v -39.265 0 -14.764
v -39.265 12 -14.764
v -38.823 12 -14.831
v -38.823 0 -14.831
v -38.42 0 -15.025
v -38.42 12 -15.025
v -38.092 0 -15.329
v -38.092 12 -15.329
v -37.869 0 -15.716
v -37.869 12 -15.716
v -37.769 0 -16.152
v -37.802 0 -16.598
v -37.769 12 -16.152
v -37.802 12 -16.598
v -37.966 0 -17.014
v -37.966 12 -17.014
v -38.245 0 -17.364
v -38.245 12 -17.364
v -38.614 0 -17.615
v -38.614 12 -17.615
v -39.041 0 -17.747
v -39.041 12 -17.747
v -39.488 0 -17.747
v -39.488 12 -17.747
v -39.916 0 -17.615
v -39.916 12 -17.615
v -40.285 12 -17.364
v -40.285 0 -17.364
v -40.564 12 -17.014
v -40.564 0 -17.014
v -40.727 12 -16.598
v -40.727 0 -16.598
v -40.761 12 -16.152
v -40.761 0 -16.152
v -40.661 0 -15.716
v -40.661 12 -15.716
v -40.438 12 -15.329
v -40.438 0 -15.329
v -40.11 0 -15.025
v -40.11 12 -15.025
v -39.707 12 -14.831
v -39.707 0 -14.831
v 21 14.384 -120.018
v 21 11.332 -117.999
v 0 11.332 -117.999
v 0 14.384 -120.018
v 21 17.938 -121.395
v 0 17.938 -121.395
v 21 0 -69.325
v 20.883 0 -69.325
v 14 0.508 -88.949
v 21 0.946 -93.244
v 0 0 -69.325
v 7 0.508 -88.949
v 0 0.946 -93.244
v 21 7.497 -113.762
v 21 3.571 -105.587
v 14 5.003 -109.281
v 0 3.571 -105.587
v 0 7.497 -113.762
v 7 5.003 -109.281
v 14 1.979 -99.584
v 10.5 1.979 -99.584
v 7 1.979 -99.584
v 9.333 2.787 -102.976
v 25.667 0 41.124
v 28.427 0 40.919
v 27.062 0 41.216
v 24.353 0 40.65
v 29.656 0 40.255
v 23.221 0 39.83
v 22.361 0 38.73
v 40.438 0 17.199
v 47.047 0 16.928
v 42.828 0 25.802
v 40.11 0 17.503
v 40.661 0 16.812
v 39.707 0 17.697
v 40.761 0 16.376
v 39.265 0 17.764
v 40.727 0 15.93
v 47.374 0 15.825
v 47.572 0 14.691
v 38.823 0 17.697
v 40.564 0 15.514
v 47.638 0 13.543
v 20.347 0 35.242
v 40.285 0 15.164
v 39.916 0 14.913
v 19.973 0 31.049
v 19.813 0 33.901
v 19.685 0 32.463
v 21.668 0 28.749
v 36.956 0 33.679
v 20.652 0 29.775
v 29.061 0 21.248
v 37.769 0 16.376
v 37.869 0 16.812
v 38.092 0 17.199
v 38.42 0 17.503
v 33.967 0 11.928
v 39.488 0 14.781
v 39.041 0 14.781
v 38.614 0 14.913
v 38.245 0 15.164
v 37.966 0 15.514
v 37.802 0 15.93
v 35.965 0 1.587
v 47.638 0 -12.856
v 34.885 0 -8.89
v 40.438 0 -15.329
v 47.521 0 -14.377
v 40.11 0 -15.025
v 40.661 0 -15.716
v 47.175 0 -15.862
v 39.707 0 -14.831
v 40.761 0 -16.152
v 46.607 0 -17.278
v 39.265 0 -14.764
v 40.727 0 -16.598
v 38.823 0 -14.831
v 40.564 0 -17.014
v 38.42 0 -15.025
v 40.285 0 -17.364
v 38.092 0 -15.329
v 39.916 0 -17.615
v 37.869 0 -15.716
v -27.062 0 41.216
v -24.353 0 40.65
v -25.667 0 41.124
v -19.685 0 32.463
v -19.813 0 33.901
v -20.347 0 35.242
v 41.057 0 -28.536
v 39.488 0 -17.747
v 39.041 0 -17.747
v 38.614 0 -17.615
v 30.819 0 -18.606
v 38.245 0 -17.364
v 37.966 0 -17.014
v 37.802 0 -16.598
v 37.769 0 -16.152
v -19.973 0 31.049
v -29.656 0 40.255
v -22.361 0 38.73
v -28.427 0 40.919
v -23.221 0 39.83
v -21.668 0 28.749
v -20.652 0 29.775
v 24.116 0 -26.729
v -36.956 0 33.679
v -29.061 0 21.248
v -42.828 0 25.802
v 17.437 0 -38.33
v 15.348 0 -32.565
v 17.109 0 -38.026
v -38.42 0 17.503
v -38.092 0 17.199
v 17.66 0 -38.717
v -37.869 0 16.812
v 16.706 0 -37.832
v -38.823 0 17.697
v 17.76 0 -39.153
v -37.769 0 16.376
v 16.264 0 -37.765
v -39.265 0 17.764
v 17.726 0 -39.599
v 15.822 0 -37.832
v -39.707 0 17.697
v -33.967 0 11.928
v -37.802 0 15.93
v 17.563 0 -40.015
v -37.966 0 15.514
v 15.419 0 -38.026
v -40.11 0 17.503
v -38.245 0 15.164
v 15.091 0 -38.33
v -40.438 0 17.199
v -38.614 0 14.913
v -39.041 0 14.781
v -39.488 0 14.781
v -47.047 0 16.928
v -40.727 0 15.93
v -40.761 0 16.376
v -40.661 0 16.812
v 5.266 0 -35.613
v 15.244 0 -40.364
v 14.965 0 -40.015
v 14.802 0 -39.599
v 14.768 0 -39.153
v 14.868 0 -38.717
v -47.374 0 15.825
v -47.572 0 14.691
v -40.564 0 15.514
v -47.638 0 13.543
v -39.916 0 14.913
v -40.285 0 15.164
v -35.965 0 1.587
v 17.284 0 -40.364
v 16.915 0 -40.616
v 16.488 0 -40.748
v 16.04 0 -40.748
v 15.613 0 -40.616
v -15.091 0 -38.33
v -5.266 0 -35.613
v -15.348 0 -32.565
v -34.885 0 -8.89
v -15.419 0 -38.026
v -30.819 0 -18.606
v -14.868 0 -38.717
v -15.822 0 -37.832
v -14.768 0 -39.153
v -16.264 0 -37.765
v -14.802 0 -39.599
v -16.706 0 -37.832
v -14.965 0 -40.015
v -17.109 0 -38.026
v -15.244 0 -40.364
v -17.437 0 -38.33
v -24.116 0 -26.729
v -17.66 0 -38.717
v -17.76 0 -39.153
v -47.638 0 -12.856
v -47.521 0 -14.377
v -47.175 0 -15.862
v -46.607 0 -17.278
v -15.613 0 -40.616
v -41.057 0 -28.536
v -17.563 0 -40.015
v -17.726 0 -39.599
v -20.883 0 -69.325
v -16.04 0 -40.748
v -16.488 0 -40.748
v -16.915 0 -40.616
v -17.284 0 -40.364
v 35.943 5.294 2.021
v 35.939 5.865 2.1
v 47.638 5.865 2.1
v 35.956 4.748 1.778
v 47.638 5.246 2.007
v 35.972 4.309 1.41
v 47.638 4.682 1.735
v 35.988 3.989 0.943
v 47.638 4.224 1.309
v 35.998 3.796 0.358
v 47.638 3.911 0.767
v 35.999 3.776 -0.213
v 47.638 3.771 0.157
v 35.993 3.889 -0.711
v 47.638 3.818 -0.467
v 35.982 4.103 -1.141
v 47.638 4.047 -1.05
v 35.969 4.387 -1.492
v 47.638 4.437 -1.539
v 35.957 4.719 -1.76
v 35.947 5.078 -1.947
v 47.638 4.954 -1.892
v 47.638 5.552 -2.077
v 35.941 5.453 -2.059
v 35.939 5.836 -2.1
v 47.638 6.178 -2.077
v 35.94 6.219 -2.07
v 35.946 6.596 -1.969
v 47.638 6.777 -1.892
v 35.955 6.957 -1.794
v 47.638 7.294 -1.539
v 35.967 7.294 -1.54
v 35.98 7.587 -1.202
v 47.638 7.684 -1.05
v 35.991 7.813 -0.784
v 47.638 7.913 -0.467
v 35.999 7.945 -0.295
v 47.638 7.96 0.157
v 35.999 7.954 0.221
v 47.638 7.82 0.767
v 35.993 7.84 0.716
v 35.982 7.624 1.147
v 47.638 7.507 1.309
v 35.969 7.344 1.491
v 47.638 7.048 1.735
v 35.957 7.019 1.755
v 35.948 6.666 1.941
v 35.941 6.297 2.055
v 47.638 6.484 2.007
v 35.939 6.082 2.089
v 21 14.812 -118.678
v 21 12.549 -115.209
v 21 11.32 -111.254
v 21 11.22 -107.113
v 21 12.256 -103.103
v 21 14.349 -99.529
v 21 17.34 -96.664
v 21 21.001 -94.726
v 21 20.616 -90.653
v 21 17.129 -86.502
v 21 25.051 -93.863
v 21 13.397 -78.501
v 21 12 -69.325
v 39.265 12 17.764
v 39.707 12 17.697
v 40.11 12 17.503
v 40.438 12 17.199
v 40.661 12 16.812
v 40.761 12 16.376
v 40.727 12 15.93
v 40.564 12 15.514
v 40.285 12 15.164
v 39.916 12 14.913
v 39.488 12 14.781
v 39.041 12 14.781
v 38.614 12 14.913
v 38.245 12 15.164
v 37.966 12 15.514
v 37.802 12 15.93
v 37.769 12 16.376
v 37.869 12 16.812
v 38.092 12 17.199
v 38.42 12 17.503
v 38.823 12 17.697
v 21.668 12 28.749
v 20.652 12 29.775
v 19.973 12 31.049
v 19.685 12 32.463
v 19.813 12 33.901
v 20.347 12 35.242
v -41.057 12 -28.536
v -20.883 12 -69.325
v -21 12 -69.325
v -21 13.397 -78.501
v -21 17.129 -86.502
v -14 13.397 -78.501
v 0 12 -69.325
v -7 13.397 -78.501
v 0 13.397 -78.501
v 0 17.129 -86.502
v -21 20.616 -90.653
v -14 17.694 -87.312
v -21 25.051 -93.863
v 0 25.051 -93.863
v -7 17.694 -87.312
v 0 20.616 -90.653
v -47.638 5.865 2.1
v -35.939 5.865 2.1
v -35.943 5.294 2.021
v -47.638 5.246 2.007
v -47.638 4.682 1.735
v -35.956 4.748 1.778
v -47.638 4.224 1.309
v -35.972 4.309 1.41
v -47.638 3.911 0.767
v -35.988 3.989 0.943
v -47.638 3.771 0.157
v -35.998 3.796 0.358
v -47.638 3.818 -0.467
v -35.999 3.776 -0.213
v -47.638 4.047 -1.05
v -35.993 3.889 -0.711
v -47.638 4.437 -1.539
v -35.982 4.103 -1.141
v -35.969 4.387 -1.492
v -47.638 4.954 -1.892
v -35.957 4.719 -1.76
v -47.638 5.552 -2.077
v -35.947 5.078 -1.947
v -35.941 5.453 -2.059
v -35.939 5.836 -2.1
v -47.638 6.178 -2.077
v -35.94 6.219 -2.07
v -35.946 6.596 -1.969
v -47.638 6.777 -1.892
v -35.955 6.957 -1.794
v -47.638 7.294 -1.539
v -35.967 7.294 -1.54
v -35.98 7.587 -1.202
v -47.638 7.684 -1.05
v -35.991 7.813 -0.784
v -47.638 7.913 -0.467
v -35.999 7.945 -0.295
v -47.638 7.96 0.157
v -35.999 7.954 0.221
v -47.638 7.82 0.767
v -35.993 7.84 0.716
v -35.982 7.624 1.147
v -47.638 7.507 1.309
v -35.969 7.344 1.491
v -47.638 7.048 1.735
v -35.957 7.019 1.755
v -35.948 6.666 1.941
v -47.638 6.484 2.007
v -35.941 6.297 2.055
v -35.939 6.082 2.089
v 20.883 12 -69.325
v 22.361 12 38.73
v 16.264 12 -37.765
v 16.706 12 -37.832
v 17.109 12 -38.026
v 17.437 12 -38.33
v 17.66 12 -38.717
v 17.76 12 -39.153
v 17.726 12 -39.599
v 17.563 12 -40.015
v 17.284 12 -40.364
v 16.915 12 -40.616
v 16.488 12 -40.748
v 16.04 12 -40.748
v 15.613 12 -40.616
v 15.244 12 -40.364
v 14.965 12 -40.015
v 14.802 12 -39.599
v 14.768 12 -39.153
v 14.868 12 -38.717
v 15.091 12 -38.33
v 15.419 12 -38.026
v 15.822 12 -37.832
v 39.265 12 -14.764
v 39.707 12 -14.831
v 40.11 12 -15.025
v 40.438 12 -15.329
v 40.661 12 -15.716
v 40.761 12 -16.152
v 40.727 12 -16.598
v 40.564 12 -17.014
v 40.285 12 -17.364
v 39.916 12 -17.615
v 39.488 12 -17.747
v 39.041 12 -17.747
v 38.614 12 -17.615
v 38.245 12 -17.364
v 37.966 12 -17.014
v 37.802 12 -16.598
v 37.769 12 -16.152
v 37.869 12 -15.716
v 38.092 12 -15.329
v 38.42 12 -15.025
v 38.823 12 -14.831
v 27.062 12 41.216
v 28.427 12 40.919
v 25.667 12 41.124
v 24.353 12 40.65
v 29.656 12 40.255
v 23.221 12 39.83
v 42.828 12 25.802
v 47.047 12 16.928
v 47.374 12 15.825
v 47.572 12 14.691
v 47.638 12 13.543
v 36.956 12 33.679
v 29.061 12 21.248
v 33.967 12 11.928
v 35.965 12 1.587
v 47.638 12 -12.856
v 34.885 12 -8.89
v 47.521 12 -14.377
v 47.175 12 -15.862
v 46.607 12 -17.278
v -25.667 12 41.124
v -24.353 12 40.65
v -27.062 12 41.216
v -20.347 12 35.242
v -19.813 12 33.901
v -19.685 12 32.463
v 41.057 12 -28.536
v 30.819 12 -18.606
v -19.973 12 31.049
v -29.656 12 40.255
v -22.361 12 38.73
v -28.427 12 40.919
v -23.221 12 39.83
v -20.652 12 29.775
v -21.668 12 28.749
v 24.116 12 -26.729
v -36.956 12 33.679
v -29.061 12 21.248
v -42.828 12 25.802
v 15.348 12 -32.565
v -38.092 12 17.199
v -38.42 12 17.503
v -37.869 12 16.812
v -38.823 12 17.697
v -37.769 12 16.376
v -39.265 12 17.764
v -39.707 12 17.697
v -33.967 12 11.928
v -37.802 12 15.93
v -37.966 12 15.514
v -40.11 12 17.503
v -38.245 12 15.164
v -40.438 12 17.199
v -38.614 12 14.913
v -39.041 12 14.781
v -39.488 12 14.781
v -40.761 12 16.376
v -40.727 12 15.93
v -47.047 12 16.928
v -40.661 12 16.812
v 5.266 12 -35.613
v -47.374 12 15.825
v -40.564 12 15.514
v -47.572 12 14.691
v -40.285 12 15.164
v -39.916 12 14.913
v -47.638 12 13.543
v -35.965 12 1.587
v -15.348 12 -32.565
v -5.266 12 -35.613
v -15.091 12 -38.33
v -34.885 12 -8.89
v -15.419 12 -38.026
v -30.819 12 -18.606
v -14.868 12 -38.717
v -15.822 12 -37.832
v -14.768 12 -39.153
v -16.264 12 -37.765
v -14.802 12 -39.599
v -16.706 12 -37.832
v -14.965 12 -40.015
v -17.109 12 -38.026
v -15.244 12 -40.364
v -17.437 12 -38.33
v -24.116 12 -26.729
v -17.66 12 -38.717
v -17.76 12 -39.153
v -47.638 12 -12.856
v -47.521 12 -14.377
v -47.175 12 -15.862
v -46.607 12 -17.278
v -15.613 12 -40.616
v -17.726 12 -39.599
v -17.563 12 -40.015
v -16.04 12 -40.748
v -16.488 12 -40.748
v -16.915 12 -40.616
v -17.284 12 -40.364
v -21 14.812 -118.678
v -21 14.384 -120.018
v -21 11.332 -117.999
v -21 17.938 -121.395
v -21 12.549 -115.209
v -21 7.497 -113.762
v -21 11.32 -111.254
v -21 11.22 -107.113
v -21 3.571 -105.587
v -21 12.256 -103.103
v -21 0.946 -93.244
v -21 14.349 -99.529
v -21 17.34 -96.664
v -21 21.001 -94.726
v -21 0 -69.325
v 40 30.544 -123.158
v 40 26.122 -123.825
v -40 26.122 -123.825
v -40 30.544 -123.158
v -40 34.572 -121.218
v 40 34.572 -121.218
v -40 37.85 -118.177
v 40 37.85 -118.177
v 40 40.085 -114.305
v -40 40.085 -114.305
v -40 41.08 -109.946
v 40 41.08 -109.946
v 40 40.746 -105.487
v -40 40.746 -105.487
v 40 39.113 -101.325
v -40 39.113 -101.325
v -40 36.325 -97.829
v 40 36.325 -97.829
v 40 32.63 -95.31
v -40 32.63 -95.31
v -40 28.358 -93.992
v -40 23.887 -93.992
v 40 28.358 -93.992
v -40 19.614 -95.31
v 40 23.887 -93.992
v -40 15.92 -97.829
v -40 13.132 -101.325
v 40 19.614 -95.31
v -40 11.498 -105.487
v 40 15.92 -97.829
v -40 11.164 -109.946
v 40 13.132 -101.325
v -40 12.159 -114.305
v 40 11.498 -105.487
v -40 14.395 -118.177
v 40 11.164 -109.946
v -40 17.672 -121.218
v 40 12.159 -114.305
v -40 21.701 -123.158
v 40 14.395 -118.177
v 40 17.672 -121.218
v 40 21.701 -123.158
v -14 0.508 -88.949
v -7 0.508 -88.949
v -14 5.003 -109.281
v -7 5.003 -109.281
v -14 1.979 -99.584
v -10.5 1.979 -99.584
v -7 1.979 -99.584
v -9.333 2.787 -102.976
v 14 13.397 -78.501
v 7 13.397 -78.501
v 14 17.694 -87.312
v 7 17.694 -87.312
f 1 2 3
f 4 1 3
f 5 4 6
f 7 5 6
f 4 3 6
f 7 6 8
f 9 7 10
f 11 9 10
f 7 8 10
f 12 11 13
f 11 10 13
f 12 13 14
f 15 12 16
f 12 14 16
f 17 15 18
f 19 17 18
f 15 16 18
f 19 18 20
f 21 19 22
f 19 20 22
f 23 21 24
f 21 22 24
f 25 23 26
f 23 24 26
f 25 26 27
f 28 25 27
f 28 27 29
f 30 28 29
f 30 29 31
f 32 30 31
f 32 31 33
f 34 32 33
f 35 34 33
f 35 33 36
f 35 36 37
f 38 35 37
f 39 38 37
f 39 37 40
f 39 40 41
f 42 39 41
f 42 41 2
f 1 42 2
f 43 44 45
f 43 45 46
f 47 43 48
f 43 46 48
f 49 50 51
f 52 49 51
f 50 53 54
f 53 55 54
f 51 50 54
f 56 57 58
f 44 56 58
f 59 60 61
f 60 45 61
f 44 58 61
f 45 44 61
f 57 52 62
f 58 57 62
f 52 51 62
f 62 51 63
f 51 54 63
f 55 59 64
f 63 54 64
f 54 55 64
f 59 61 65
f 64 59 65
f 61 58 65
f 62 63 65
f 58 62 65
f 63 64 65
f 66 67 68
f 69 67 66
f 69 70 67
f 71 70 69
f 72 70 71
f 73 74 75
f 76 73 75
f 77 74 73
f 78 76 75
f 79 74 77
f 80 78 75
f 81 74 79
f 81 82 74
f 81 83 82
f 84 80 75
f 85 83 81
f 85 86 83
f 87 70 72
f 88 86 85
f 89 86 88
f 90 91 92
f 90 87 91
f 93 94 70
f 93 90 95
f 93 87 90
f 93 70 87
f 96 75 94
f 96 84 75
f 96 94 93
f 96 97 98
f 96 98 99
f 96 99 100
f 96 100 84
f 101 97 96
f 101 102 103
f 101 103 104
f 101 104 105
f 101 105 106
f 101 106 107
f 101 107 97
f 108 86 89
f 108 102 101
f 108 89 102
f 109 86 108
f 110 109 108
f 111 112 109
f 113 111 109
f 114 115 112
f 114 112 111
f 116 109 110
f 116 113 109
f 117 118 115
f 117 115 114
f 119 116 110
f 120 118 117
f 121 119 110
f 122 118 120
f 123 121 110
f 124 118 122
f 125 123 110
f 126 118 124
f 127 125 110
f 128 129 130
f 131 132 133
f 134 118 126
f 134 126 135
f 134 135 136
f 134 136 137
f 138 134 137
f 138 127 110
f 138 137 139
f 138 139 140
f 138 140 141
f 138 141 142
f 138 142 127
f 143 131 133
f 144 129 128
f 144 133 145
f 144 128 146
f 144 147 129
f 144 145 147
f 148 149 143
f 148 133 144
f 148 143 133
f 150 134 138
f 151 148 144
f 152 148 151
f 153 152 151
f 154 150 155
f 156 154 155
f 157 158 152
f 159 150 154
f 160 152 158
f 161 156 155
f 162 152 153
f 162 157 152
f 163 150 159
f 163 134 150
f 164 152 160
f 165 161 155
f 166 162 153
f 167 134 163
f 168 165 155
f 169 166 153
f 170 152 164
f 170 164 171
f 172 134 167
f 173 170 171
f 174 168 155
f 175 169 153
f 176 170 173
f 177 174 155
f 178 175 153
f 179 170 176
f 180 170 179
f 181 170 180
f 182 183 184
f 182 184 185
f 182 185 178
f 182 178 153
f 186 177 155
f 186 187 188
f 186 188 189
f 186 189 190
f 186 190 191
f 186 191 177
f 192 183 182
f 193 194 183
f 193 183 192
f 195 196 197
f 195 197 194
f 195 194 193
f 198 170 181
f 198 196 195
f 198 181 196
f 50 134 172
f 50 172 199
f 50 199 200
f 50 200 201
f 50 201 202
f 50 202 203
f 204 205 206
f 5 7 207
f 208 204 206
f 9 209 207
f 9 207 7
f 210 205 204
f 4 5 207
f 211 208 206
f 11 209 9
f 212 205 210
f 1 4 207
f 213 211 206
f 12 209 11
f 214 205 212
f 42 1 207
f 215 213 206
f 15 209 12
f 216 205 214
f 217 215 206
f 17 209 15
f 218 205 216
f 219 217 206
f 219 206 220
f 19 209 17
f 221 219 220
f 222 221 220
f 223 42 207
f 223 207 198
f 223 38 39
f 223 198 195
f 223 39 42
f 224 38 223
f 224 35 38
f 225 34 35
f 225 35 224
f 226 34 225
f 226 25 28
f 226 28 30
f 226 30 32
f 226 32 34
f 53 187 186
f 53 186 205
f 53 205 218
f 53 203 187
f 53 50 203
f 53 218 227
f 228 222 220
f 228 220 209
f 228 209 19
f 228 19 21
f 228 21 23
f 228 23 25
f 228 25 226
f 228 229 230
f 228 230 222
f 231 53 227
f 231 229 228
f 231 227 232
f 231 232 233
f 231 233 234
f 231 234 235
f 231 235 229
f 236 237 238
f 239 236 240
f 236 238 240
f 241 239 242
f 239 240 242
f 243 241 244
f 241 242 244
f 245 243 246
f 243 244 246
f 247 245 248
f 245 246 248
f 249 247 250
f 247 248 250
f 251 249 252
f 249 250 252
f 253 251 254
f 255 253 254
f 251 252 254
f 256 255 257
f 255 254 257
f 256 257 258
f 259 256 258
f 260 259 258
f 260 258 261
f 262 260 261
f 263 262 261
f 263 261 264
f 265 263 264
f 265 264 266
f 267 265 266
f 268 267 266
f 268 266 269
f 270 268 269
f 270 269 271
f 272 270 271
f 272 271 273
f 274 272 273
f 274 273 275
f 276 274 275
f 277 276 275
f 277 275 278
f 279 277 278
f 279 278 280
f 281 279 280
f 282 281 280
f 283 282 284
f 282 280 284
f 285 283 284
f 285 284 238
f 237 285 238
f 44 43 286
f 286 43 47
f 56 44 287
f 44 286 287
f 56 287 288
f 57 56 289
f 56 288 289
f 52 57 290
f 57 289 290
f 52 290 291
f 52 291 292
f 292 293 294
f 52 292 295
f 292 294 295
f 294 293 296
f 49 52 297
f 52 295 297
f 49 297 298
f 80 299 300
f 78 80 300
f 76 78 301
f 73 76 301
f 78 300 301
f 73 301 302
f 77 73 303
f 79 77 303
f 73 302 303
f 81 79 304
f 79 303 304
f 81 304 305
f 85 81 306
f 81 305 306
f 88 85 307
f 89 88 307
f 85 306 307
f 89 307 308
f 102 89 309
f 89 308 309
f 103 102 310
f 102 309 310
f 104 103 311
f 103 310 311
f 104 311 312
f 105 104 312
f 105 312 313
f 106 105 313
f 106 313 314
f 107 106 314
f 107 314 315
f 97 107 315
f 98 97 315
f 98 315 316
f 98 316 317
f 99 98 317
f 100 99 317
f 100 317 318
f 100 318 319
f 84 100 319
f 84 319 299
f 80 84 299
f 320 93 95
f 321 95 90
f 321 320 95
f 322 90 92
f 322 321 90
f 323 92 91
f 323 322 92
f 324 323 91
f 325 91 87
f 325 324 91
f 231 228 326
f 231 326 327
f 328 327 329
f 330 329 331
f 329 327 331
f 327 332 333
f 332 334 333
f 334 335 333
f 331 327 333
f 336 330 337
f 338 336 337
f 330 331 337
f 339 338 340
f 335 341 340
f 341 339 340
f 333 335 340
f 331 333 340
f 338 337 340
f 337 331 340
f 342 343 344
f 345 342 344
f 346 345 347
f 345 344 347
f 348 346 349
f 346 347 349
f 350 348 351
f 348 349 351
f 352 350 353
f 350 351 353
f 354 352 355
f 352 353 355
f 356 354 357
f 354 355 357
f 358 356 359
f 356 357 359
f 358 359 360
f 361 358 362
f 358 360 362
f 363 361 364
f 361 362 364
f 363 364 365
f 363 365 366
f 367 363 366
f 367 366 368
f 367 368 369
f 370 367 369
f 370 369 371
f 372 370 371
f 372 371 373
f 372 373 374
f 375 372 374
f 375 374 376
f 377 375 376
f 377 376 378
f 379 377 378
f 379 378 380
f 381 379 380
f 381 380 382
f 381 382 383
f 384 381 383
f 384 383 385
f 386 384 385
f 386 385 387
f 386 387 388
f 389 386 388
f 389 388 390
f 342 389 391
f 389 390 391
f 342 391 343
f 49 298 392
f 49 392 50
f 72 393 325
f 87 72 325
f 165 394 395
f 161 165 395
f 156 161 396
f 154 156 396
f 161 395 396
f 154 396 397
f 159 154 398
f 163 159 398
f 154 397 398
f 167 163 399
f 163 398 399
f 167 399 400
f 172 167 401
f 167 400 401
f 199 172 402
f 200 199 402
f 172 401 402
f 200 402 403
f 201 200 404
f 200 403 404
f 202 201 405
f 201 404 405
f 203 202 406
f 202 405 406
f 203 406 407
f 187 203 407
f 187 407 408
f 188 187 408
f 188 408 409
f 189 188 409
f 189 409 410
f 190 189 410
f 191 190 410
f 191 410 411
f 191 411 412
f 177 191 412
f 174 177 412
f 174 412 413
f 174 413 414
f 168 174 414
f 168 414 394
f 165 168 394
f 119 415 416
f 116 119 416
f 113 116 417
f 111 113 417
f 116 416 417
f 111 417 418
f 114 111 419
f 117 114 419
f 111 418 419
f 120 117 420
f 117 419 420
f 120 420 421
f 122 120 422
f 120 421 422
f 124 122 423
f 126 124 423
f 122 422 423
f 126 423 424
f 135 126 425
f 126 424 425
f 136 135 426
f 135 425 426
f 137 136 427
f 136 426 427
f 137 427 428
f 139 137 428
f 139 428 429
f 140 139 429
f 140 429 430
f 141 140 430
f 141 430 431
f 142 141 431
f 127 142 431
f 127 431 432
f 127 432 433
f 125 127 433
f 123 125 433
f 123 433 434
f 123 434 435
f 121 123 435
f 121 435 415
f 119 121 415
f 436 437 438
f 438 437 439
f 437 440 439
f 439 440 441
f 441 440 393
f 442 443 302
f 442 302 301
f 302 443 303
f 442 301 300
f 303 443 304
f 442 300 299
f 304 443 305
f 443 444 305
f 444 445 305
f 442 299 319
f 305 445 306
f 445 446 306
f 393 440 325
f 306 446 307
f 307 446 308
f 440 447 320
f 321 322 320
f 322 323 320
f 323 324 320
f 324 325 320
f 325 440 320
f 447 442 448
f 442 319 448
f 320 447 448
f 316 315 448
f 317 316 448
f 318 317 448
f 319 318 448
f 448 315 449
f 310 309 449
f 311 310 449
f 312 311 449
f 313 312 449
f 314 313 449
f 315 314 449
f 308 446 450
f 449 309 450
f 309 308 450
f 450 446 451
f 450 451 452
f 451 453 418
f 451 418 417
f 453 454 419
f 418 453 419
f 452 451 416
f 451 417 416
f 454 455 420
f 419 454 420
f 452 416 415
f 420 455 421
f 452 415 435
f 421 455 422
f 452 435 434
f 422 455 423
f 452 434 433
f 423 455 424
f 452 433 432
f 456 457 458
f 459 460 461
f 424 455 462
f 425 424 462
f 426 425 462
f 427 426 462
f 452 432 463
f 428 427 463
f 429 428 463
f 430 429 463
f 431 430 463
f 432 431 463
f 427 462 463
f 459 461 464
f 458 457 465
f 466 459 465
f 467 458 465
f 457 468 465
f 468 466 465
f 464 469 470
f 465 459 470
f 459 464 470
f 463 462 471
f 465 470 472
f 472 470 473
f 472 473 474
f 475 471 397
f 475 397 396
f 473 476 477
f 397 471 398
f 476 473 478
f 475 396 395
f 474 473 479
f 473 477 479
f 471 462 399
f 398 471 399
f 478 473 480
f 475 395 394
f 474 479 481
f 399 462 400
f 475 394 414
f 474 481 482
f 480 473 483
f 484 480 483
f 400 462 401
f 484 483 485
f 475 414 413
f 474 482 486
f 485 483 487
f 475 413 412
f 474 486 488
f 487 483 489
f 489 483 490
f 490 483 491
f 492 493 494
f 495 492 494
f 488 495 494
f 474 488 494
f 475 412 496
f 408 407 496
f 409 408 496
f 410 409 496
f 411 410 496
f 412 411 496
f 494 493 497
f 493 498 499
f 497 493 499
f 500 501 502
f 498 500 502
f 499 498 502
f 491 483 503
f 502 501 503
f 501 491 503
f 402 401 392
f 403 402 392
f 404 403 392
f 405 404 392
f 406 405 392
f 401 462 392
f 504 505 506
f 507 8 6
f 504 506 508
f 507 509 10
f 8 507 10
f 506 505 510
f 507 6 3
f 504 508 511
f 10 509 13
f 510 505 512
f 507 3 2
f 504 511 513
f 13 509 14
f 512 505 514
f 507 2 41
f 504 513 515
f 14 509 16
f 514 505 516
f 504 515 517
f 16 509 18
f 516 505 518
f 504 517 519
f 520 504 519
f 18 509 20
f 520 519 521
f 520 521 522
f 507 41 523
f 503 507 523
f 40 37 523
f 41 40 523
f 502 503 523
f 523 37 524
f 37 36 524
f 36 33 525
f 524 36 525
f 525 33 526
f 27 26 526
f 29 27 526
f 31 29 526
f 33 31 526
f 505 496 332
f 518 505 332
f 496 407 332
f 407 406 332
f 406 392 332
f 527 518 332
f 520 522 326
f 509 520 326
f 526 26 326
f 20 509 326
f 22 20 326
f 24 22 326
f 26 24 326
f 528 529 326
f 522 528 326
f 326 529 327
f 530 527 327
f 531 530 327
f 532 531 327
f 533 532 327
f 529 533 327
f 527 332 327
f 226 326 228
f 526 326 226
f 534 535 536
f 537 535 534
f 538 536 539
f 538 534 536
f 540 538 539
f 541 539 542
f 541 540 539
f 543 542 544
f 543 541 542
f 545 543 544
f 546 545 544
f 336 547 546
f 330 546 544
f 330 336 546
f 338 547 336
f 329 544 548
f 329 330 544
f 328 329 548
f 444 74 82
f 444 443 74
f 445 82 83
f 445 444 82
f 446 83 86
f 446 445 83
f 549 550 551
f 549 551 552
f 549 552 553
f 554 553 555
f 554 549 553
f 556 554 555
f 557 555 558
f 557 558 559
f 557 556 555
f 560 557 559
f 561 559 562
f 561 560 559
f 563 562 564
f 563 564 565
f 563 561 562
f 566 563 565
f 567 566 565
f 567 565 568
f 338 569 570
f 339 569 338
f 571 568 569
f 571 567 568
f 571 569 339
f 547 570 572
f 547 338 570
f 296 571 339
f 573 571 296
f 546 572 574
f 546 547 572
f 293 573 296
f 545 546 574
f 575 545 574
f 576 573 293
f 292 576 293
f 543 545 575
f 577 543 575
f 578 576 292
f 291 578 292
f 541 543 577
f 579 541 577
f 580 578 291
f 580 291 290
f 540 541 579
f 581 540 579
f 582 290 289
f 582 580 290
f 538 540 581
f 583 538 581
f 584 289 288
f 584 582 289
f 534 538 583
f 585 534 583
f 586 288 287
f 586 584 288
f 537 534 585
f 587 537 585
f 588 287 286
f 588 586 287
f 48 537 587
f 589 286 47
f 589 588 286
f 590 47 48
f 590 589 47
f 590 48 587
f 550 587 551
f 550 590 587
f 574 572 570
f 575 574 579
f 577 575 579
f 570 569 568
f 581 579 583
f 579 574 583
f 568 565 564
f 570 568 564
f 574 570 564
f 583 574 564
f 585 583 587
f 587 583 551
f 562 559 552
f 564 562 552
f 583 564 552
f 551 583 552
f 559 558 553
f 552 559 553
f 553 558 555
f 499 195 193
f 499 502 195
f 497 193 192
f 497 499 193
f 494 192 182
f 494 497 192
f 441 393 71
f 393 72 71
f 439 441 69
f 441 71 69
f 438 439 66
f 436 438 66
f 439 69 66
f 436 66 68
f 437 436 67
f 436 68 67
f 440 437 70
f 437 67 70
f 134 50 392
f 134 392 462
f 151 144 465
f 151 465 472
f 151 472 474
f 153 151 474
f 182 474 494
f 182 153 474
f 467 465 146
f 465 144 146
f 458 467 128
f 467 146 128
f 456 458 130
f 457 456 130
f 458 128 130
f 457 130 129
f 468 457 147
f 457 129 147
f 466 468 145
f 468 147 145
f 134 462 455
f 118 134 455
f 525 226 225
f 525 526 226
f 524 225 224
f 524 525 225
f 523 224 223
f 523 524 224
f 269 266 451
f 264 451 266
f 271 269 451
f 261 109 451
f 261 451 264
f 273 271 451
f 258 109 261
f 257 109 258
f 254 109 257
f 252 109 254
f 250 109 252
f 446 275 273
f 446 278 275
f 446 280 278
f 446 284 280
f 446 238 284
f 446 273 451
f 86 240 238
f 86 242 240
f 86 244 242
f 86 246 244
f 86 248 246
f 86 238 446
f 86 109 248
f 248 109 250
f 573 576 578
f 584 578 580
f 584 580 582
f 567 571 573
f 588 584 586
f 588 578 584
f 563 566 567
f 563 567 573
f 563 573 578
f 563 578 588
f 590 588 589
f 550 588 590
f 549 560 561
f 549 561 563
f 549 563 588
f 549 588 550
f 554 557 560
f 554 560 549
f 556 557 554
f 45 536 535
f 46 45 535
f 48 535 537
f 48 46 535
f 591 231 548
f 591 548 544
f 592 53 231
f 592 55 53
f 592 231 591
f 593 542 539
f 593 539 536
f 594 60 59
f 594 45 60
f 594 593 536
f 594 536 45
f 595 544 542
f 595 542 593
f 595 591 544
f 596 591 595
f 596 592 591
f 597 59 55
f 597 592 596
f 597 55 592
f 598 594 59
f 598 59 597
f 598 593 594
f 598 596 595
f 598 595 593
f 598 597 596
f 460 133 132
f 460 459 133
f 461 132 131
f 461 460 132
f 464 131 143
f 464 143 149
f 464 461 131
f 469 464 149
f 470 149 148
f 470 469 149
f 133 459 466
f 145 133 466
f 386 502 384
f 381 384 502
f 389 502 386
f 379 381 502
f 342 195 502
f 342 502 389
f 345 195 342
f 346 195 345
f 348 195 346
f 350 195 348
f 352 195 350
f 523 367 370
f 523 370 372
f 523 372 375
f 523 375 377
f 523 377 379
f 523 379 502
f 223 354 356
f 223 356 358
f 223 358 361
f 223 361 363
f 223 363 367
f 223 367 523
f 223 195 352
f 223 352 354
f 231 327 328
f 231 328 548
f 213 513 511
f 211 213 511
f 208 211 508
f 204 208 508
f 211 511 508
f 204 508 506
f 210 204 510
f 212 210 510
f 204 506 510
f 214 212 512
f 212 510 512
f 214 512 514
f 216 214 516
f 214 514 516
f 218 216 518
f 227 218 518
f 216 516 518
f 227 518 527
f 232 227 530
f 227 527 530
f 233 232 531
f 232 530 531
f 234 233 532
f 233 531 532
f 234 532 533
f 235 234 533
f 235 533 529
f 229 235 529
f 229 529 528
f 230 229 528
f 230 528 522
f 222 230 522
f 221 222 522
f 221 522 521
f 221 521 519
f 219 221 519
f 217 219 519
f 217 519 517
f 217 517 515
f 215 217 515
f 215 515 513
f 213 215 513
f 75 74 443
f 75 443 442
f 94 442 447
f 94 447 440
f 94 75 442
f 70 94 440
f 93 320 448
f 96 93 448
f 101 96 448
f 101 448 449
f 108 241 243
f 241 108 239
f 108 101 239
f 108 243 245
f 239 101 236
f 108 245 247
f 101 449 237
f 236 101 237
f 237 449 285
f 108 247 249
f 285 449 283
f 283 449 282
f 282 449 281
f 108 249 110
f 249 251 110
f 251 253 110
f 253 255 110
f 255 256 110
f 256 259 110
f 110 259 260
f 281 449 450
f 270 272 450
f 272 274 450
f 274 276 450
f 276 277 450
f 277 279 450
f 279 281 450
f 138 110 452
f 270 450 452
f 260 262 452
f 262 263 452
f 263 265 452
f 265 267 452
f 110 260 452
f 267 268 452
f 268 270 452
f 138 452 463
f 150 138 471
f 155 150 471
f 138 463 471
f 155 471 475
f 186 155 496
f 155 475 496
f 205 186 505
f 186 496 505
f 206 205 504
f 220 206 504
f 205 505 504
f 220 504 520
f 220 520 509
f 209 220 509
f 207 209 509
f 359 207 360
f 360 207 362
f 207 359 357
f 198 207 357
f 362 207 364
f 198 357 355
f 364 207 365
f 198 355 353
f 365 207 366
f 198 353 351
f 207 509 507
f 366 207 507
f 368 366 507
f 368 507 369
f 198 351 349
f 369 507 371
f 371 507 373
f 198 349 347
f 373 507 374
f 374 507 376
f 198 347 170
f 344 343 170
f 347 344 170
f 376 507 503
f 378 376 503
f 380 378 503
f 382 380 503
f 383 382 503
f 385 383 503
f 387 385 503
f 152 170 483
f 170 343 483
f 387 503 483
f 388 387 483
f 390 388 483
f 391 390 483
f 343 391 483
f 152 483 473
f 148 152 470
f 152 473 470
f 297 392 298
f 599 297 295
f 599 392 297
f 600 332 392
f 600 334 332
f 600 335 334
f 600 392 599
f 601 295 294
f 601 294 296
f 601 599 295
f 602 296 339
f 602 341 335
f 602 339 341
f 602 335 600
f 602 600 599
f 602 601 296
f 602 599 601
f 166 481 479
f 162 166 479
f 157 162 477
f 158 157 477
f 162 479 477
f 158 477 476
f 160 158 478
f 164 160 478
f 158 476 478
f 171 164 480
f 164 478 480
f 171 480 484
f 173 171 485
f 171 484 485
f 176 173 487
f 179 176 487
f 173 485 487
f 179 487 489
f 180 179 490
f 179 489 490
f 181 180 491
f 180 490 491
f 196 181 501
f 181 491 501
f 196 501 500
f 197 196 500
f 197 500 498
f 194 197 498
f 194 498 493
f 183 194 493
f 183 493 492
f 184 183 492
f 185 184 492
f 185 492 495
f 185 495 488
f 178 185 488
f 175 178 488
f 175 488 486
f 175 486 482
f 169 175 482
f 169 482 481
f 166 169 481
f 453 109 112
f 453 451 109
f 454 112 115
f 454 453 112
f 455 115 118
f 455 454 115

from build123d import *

# Parameters (mm, degrees)
BOSS_EXTRUDE1_DEPTH = 12
SKETCH2_R           = 18
CUT_EXTRUDE1_DEPTH  = 12
BOSS_EXTRUDE2_DEPTH = 21
SKETCH8_R           = 15
BOSS_EXTRUDE4_DEPTH = 40
SKETCH12_R          = 1.5
CUT_EXTRUDE3_DEPTH  = 136.830697271
SKETCH13_R          = 36
CUT_EXTRUDE4_DEPTH  = 136.830697271
CUT_EXTRUDE5_DEPTH  = 136.830697271
FILLET1_R           = 5
M5_TAPPED_HOLE1_D   = 4.2
CUT_EXTRUDE6_DEPTH  = 136.830697306
FILLET2_R           = 10


with BuildPart() as part:
    # Sketch1 → Boss-Extrude1 (new body)
    with BuildSketch(Plane(origin=(0, 0, 0), x_dir=(1, 0, 0), z_dir=(0, 1, 0))):
        with BuildLine():
            Line((-20.882573235, 69.325415808), (20.882573235, 69.325415808))
            Line((20.882573235, 69.325415808), (41.057018878, 28.536313722))
            ThreePointArc((41.057018878, 28.536313722), (44.846867978, 22.107881683), (47.637749602, 15.186994859))
            Line((47.637749602, 15.186994859), (47.637749602, -15.186994859))
            ThreePointArc((47.637749602, -15.186994859), (0, -50), (-47.637749602, -15.186994859))
            Line((-47.637749602, -15.186994859), (-47.637749602, 15.186994859))
            ThreePointArc((-47.637749602, 15.186994859), (-44.846867978, 22.107881683), (-41.057018878, 28.536313722))
            Line((-41.057018878, 28.536313722), (-20.882573235, 69.325415808))
        make_face()
    extrude(amount=BOSS_EXTRUDE1_DEPTH)

    # Sketch2 → Cut-Extrude1 (cut)
    with BuildSketch(Plane.XZ):
        with Locations(Location((0, 0, 0), (0, 0, 270))):
            Circle(SKETCH2_R)
    extrude(amount=-CUT_EXTRUDE1_DEPTH, mode=Mode.SUBTRACT)

    # Sketch4 → Boss-Extrude2 (add, symmetric)
    with BuildSketch(Plane(origin=(0, 0, 0), x_dir=(0, 0, -1), z_dir=(1, 0, 0))):
        with BuildLine():
            add(Edge.make_bspline(
                [(69.325415808, 12), (78.050182199, 12), (89.075370915, 16.109716253), (93.862821874, 25.051459816)],
                knots=[0, 0, 0, 0, 0.77117819, 0.77117819, 0.77117819, 0.77117819], degree=3))
            Line((69.325415808, 12), (69.325415808, 0))
            add(Edge.make_bspline(
                [(69.325415808, 0), (85.617905629, 0), (116.367065239, -0.702532384), (121.3953127, 17.938299278)],
                knots=[0, 0, 0, 0, 1, 1, 1, 1], degree=3))
            ThreePointArc((121.3953127, 17.938299278), (105.072430052, 11.59905464), (93.862821874, 25.051459816))
        make_face()
    extrude(amount=BOSS_EXTRUDE2_DEPTH, both=True)

    # Sketch8 → Boss-Extrude4 (add, symmetric)
    with BuildSketch(Plane(origin=(0, 0, 0), x_dir=(0, 0, -1), z_dir=(1, 0, 0))):
        with Locations((108.824557436, 26.122192734)):
            Circle(SKETCH8_R)
    extrude(amount=BOSS_EXTRUDE4_DEPTH, both=True)

    # Sketch12 → Cut-Extrude3 (cut, through all)
    with BuildSketch(Plane(origin=(0, 12, 0), x_dir=(1, 0, 0), z_dir=(0, 1, 0))):
        with Locations(Location((-16.264045876, 39.264880132, 0), (0, 0, 270))):
            Circle(SKETCH12_R)
        with Locations(Location((16.264045876, 39.264880132, 0), (0, 0, 270))):
            Circle(SKETCH12_R)
        with Locations(Location((39.264880132, 16.264045876, 0), (0, 0, 270))):
            Circle(SKETCH12_R)
        with Locations(Location((39.264880132, -16.264045876, 0), (0, 0, 270))):
            Circle(SKETCH12_R)
        with Locations(Location((-39.264880132, -16.264045876, 0), (0, 0, 270))):
            Circle(SKETCH12_R)
        with Locations(Location((-39.264880132, 16.264045876, 0), (0, 0, 270))):
            Circle(SKETCH12_R)
    extrude(amount=-CUT_EXTRUDE3_DEPTH, mode=Mode.SUBTRACT)

    # Sketch13 → Cut-Extrude4 (cut, through all)
    with BuildSketch(Plane(origin=(0, 12, 0), x_dir=(1, 0, 0), z_dir=(0, 1, 0))):
        with Locations(Location((0, 0, 0), (0, 0, 270))):
            Circle(SKETCH13_R)
    extrude(amount=-CUT_EXTRUDE4_DEPTH, mode=Mode.SUBTRACT)

    # Sketch14 → Cut-Extrude5 (cut, through all)
    with BuildSketch(Plane(origin=(0, 12, 0), x_dir=(1, 0, 0), z_dir=(0, 1, 0))):
        with BuildLine():
            Line((0, 0), (-48.782083041, -84.493046326))
            ThreePointArc((-48.782083041, -84.493046326), (0, -97.564166081), (48.782083041, -84.493046326))
            Line((48.782083041, -84.493046326), (0, 0))
        make_face()
    extrude(amount=-CUT_EXTRUDE5_DEPTH, mode=Mode.SUBTRACT)

    # Fillet1
    fillet1_edges = [part.edges().sort_by_distance(p)[0] for p in [
        (-18, 6, 31.176914536),
        (18, 6, 31.176914536),
        (25, 6, 43.301270189),
        (-25, 6, 43.301270189),
    ]]
    fillet(fillet1_edges, radius=FILLET1_R)

    # M5 Tapped Hole1 (through all)
    with Locations(Plane(origin=(-47.637749602, 5.86539704, 5.141e-06), x_dir=(0, 0, -1), z_dir=(-1, 0, 0))):
        with Locations((0, 0)):
            Hole(M5_TAPPED_HOLE1_D / 2)

    # Sketch30 → Cut-Extrude6 (cut, through all)
    with BuildSketch(Plane(origin=(0, 12, 0), x_dir=(1, 0, 0), z_dir=(0, 1, 0))):
        Polygon((-41.057018878, 28.536313722), (-47.637749602, 15.186994859), (-55.094112821, 25.321901869), align=None)
        Polygon((41.057018878, 28.536313722), (47.637749602, 15.186994859), (61.944517535, 29.154568453), align=None)
    extrude(amount=-CUT_EXTRUDE6_DEPTH, mode=Mode.SUBTRACT)

    # Fillet2
    fillet2_edges = [part.edges().sort_by_distance(p)[0] for p in [
        (-41.057018878, 6, -28.536313722),
        (41.057018878, 6, -28.536313722),
        (47.637749602, 6, -15.186994859),
        (47.637749602, 6, 15.186994859),
        (-47.637749602, 6, 15.186994859),
        (-47.637749602, 6, -15.186994859),
    ]]
    fillet(fillet2_edges, radius=FILLET2_R)


solid = part.part
